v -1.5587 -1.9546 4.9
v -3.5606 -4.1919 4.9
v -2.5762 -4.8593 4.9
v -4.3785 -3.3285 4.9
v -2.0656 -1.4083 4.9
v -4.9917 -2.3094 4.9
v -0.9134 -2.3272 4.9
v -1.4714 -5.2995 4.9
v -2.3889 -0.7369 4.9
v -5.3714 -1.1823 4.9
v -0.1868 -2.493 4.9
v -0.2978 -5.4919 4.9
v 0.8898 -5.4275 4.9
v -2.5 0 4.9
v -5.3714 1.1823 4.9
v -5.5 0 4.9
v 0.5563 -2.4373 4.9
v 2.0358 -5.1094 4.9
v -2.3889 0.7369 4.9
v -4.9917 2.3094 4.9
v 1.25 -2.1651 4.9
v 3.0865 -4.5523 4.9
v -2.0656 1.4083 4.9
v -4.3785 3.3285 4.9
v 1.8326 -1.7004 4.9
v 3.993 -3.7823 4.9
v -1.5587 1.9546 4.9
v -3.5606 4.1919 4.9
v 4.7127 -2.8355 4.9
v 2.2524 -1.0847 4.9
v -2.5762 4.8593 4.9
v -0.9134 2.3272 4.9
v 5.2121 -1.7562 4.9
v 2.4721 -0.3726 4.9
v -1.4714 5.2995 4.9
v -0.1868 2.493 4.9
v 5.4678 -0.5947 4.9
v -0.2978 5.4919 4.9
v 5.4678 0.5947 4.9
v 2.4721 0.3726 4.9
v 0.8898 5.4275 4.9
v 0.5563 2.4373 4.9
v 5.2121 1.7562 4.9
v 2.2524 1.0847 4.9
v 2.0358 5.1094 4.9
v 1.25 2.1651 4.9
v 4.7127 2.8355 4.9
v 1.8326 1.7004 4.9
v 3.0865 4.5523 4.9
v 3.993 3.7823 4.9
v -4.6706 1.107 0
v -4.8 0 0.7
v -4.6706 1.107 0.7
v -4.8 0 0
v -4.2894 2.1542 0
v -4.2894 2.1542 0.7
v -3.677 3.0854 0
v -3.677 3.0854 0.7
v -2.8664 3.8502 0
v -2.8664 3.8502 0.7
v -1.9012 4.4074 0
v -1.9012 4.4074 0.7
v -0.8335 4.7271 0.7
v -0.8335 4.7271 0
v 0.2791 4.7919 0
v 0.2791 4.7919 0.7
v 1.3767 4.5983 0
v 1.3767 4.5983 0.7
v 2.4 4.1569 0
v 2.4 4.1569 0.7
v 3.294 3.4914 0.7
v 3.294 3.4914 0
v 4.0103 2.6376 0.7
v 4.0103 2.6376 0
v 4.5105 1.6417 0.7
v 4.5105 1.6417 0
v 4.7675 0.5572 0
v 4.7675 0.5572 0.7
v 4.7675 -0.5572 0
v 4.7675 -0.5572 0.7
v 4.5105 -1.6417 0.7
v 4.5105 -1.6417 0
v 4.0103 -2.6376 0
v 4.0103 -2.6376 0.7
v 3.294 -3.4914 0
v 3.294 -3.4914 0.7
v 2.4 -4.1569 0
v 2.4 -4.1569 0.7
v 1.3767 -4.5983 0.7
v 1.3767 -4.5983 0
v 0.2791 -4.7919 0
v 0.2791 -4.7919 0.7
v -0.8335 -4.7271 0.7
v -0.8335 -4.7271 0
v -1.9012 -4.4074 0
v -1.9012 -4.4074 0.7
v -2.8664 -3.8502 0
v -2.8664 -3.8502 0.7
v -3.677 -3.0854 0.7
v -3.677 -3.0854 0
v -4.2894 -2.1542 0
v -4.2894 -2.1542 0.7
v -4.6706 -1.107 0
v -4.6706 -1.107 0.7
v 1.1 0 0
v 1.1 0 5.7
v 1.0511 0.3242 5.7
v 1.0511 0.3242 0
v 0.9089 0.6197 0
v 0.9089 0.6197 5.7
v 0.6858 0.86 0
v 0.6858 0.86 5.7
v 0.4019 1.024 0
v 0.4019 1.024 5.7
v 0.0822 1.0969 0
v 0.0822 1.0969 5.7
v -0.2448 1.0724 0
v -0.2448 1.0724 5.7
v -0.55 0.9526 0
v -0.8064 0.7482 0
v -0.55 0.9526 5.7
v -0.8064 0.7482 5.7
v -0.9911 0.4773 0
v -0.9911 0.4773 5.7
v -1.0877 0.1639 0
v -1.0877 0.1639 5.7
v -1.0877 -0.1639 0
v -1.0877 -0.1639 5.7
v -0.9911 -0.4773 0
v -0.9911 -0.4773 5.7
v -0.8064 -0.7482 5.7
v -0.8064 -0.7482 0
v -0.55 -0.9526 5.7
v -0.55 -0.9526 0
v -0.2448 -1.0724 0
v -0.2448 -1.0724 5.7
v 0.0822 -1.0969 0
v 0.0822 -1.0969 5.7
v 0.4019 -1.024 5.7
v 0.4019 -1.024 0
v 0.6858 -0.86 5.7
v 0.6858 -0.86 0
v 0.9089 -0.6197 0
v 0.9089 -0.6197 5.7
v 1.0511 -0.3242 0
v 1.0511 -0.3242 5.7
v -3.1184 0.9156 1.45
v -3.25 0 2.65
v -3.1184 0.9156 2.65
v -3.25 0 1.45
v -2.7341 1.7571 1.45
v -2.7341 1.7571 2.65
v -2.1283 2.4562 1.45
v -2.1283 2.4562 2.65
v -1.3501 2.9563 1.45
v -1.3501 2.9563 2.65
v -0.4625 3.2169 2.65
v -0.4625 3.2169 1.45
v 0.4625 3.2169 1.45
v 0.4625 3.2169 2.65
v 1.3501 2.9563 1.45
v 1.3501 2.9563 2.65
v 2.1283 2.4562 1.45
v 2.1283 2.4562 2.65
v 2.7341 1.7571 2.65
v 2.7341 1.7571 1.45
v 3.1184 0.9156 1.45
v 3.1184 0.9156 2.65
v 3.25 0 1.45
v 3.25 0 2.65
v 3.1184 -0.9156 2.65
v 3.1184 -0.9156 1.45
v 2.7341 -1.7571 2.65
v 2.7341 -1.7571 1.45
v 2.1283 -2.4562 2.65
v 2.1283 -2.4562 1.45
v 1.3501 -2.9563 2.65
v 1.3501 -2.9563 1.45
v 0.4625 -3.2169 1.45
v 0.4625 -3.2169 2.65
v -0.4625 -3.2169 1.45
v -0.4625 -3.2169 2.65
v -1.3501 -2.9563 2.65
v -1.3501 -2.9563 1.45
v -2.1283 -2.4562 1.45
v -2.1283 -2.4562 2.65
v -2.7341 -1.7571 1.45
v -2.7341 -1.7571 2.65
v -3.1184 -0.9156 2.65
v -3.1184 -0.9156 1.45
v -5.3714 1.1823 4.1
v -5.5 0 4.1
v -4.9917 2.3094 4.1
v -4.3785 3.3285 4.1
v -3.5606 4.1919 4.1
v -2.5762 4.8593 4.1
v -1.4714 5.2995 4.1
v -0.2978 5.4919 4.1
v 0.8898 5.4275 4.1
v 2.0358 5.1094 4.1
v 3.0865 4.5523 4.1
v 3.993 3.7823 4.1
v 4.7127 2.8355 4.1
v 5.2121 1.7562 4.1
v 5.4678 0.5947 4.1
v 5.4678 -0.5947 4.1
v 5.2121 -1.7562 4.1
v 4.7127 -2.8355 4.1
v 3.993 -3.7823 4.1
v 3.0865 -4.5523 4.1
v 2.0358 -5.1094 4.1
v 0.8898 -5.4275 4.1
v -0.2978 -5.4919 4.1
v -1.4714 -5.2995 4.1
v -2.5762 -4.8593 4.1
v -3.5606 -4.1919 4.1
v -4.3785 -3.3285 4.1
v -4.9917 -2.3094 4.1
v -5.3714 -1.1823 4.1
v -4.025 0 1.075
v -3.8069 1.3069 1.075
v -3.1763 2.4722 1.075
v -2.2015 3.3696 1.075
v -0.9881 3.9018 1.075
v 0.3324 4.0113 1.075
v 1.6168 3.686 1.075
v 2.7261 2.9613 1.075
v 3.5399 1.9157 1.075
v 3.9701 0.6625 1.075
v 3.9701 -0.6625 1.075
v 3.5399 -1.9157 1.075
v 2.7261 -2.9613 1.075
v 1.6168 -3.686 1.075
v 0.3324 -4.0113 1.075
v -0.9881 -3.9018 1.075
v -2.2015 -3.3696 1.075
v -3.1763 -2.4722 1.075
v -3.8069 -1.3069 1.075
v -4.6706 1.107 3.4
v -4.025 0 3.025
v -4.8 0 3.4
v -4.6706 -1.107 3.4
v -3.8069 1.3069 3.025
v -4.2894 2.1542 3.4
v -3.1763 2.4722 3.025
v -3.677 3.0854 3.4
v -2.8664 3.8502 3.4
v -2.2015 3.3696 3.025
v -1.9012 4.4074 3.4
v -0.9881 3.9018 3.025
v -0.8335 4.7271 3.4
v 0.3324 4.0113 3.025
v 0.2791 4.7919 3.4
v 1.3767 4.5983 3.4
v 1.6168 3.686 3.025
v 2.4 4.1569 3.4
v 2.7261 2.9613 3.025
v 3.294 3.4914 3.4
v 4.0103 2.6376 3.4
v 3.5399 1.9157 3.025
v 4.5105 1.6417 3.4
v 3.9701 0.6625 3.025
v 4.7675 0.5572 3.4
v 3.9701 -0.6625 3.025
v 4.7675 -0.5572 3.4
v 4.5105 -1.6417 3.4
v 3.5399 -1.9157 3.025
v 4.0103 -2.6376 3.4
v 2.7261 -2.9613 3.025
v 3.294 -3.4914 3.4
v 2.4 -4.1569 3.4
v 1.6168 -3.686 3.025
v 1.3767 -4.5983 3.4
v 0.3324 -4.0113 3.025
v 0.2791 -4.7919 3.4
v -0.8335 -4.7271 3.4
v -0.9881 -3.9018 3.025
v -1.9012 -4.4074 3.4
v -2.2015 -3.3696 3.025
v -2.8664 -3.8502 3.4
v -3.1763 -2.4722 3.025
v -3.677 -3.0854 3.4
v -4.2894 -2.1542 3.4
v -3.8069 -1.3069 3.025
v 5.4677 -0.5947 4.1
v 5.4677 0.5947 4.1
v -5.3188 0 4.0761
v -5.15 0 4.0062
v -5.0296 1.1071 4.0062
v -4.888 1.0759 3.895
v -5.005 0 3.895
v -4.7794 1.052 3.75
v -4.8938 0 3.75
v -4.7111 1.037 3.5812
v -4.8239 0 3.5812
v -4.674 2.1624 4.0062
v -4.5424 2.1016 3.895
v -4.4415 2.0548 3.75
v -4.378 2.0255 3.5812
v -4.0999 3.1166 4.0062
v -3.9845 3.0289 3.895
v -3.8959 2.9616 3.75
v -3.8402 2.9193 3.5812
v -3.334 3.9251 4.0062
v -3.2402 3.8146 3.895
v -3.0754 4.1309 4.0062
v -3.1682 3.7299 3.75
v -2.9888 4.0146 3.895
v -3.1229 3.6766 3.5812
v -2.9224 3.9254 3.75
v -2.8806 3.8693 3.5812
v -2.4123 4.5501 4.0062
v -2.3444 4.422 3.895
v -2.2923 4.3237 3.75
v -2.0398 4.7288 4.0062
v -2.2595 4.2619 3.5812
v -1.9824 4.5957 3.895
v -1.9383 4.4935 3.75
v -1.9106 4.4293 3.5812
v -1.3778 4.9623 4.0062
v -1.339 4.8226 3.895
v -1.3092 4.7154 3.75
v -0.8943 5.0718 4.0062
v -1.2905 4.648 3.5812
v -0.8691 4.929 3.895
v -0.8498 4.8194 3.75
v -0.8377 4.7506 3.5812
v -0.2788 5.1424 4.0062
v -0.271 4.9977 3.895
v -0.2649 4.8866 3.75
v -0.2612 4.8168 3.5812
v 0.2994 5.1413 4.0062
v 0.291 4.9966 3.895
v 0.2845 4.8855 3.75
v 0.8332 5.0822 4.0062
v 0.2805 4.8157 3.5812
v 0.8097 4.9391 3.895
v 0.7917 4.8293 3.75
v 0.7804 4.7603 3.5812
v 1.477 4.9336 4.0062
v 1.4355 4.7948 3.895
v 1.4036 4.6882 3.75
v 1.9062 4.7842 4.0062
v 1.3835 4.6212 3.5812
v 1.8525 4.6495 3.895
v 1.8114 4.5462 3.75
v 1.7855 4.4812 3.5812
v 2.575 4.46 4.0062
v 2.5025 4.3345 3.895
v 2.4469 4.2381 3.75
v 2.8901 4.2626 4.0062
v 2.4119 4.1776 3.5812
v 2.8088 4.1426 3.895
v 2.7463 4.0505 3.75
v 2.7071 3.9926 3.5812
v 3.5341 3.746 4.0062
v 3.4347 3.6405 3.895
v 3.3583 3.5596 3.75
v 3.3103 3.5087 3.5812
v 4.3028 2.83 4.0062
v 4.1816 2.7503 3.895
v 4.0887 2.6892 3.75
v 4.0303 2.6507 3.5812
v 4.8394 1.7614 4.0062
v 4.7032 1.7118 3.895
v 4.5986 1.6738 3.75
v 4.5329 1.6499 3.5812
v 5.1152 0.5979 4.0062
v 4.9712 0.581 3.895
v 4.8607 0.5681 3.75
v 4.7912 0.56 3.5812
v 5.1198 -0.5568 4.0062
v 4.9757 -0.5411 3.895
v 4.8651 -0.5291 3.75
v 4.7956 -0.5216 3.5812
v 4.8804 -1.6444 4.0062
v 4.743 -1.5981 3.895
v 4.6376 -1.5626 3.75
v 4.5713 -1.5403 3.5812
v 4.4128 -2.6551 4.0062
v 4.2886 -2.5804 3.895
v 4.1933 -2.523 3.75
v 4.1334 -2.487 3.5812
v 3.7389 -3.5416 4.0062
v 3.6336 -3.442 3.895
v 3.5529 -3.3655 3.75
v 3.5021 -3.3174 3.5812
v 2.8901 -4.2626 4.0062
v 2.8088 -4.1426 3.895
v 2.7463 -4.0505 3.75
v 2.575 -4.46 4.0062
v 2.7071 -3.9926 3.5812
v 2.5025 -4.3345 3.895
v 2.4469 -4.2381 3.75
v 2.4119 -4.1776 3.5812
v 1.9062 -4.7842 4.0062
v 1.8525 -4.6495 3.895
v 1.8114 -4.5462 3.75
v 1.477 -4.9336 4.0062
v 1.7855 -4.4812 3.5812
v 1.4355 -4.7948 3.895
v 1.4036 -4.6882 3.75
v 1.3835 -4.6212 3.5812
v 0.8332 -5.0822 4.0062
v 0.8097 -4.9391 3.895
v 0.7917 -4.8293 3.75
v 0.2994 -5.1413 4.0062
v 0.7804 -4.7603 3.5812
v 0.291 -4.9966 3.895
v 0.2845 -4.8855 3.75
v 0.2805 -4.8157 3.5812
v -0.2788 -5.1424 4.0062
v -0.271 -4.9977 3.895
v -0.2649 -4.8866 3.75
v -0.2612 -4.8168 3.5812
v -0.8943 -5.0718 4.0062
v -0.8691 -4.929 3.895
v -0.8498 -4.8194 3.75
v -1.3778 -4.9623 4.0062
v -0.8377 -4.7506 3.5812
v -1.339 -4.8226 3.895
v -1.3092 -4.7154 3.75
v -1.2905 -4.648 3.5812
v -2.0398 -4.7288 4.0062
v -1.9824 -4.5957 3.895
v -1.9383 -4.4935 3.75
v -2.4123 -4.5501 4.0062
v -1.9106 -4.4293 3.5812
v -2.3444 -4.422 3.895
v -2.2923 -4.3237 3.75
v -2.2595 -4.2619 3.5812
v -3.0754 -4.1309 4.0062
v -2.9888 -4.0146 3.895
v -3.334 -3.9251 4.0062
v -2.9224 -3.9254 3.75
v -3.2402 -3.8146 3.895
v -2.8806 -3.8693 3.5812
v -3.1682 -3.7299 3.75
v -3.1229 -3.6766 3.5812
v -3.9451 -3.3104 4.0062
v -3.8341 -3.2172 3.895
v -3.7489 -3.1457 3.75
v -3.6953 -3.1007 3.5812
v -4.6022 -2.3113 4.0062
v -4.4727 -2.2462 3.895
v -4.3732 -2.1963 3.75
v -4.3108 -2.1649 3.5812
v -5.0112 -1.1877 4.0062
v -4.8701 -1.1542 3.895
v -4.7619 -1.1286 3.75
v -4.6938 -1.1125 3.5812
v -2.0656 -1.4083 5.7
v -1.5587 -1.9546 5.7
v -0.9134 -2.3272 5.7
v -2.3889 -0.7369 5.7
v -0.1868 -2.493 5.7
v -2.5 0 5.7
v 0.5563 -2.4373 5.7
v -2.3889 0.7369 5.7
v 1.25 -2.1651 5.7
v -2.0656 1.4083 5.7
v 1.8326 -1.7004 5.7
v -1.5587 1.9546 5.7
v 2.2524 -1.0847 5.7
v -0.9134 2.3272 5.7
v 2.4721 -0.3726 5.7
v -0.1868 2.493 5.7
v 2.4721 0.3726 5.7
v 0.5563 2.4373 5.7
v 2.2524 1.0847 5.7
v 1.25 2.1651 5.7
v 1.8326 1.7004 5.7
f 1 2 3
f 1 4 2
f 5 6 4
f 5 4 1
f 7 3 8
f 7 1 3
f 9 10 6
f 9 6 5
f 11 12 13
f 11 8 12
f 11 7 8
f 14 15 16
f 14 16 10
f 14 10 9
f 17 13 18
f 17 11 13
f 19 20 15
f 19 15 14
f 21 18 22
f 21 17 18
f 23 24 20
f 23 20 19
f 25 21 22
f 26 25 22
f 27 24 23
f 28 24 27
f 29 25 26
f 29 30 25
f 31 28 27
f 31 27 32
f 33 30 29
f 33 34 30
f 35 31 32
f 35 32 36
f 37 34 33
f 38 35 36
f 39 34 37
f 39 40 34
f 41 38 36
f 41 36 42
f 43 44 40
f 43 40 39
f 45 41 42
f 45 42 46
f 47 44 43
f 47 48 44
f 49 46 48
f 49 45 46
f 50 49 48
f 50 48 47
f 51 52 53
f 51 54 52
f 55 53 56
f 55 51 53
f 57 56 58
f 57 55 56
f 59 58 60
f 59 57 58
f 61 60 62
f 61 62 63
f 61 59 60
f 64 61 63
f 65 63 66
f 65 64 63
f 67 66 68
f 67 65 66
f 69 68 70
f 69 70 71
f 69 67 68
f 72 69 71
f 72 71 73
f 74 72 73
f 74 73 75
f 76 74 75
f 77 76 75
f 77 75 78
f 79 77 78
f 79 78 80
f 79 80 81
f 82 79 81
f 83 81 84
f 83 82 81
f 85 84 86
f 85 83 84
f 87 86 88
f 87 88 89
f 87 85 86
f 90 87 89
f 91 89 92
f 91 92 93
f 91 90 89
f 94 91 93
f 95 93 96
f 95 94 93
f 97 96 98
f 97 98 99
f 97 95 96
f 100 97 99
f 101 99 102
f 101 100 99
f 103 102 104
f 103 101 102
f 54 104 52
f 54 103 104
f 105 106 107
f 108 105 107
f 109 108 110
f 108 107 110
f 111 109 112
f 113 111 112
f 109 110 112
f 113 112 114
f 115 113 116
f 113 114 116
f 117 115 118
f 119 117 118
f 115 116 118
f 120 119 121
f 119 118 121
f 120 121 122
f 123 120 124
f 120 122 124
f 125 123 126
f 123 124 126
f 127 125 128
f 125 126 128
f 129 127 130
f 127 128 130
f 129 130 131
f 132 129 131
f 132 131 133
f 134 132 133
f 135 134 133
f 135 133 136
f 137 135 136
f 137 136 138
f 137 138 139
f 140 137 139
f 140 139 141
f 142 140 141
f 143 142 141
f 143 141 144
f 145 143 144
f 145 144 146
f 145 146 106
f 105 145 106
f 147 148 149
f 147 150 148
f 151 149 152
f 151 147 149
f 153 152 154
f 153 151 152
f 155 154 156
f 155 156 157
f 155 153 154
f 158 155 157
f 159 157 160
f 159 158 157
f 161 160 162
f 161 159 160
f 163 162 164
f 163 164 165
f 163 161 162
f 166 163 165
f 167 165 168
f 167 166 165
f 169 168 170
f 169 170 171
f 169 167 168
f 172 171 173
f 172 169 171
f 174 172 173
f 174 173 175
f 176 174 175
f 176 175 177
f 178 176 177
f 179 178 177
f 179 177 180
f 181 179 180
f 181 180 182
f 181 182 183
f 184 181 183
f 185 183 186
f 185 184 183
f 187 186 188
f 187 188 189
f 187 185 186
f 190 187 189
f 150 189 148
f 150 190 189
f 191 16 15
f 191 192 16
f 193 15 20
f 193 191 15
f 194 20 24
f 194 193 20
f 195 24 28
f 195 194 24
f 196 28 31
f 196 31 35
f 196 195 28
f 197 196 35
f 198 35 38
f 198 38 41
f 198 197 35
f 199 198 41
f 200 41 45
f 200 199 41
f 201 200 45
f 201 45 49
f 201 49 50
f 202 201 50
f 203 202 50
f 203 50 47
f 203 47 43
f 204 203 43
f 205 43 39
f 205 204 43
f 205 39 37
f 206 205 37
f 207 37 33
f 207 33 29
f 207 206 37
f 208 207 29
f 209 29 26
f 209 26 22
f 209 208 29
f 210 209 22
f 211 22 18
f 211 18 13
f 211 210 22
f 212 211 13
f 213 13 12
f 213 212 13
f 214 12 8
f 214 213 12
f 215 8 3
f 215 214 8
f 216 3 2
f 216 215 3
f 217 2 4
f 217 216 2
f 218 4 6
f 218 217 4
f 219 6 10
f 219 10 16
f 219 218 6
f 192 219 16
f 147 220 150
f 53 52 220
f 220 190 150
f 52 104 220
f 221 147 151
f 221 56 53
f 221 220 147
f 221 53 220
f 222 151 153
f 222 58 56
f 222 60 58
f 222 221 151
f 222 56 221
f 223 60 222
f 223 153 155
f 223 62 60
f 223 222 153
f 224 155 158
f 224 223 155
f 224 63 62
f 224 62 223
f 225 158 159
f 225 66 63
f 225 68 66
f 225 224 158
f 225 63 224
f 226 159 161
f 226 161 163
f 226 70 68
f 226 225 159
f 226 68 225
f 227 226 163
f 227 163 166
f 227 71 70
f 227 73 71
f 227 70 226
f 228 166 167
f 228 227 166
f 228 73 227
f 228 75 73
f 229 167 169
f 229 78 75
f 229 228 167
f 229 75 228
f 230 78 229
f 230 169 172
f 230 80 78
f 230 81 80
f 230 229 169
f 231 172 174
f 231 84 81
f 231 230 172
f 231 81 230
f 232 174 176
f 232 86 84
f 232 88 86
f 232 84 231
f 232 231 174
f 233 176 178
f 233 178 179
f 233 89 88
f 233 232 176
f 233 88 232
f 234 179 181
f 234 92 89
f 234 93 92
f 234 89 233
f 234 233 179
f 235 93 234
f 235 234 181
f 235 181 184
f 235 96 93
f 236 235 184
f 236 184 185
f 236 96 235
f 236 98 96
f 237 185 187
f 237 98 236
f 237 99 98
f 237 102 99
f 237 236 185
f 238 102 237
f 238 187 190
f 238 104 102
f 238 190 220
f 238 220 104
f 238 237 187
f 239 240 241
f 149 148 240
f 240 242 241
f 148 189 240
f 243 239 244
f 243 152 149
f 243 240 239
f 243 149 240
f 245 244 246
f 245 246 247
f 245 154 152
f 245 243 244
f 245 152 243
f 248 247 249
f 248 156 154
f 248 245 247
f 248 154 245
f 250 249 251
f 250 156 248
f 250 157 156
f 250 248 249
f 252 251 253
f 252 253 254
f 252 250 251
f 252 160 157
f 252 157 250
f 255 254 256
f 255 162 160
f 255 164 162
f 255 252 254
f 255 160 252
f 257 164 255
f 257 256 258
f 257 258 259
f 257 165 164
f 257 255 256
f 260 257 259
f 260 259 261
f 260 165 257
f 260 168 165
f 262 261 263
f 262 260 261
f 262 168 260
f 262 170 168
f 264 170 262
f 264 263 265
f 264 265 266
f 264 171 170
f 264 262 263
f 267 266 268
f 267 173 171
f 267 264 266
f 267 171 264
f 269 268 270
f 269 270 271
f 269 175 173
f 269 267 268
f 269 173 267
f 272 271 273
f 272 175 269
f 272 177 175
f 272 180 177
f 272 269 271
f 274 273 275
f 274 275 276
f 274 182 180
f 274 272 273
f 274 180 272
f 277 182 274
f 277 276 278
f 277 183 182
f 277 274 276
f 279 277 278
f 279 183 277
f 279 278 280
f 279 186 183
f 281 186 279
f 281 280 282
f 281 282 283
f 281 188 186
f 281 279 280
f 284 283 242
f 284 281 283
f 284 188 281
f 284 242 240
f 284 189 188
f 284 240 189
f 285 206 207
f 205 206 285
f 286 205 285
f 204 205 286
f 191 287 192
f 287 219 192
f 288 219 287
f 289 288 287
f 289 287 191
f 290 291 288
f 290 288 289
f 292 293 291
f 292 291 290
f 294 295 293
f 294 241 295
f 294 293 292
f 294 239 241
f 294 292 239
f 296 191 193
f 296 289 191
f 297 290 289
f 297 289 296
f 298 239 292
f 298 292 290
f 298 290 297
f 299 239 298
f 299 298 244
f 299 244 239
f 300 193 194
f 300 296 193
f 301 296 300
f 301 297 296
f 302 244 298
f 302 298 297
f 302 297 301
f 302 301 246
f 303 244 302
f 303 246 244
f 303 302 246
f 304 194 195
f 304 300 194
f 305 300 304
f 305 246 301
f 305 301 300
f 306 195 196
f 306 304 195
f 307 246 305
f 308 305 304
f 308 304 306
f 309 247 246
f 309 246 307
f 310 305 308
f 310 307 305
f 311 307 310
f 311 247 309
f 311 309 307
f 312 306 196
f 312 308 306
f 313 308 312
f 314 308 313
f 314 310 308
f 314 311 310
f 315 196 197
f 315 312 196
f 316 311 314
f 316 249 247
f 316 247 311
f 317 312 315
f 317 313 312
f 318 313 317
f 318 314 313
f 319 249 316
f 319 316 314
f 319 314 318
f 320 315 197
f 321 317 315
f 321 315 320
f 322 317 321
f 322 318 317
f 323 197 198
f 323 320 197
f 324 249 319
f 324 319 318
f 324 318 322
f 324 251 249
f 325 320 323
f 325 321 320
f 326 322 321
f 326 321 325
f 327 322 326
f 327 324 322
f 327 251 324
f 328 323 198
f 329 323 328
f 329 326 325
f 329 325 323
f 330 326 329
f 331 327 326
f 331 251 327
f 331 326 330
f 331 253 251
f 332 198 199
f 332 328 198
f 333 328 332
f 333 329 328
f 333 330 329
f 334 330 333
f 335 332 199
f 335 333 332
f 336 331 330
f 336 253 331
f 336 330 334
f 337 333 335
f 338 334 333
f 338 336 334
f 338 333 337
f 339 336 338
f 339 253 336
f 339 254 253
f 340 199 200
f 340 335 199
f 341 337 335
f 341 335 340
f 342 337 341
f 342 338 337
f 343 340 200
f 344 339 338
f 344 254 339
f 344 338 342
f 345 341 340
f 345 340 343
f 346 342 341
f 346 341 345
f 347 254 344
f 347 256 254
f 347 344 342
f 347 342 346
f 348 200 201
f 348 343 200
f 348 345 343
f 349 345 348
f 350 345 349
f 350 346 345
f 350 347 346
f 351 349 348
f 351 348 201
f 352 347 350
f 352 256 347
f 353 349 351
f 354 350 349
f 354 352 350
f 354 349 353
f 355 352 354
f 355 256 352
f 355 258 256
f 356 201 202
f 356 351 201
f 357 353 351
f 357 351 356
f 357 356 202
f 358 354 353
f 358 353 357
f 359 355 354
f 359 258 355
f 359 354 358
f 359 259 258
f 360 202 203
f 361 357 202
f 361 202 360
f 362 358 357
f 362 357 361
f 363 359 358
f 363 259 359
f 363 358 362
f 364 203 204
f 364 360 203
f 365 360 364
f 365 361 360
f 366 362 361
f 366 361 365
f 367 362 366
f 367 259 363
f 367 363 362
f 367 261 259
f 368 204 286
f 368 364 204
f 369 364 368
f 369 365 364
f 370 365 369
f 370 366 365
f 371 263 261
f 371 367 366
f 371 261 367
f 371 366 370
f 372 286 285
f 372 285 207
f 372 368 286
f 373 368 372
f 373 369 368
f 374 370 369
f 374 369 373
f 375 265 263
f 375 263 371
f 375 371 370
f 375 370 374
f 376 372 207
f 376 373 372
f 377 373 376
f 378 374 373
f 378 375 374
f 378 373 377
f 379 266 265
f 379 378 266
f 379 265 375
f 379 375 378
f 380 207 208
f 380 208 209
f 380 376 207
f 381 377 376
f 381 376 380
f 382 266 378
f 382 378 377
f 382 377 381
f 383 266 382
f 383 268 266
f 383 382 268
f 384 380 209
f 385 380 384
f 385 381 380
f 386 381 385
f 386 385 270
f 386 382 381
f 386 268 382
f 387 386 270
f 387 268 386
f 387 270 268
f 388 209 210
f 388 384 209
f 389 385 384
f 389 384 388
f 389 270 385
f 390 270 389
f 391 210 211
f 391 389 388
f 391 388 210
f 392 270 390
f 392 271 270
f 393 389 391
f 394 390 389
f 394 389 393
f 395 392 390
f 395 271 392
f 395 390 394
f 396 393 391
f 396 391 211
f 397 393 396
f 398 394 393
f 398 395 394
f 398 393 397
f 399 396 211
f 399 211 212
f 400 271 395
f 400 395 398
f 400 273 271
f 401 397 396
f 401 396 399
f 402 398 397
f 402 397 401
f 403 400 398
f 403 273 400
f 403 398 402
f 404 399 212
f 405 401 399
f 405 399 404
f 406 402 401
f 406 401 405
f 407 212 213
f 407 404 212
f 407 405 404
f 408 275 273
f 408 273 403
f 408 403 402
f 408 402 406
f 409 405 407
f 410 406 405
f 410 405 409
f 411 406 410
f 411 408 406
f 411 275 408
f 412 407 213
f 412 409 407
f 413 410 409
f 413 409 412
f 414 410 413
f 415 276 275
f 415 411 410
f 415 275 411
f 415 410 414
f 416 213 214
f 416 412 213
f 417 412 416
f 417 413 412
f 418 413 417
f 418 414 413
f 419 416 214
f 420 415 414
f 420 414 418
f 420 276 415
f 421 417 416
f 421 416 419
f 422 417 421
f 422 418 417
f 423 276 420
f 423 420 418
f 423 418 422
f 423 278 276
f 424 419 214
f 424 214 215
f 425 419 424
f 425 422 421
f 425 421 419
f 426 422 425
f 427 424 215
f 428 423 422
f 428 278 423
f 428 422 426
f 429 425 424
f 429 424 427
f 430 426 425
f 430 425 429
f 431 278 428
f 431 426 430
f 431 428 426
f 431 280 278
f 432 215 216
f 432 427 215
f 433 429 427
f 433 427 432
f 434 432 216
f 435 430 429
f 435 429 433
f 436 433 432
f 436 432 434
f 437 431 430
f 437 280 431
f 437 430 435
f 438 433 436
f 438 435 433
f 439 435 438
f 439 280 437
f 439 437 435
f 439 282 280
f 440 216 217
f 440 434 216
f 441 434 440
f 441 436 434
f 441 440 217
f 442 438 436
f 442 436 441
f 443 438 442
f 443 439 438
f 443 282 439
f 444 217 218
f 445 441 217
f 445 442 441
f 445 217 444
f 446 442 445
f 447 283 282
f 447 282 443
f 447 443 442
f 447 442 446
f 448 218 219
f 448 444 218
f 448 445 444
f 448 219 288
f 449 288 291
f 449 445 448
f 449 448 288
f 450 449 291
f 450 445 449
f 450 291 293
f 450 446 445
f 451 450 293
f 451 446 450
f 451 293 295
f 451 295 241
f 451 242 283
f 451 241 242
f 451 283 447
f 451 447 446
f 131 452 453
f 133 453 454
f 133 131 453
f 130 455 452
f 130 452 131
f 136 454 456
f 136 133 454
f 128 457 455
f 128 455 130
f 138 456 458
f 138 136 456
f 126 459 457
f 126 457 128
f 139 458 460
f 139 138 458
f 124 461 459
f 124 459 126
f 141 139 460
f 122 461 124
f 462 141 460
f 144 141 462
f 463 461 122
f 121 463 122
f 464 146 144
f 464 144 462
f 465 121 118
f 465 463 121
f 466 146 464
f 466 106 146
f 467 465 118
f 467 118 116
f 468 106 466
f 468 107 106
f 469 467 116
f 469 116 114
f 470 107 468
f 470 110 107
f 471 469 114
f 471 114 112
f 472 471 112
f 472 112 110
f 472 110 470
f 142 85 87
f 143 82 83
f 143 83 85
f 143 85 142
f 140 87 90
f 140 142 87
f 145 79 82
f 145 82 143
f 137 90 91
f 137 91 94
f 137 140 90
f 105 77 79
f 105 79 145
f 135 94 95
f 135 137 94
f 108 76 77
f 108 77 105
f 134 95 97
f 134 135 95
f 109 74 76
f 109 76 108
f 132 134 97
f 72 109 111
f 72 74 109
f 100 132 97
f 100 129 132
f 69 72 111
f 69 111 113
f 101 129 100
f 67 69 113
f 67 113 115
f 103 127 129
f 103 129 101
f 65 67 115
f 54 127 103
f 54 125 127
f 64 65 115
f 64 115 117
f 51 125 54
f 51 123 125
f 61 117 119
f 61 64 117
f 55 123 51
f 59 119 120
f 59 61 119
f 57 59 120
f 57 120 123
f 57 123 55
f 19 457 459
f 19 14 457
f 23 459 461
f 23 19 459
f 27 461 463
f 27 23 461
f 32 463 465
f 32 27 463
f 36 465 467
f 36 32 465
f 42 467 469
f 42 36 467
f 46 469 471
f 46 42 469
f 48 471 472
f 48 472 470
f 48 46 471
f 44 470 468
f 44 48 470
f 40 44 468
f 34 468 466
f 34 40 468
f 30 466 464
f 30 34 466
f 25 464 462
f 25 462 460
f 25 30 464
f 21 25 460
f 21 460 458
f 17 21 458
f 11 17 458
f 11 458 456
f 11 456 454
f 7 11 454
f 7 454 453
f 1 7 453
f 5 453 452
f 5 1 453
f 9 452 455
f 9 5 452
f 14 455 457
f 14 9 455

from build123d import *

# Parameters (mm, degrees)
F2_R     = 0.69999
F3_R     = 1.1
F4_DEPTH = 5.701


# Not quite as in the source:
# - a fillet or chamfer is up to 0.001 mm smaller than in the source, because OpenCascade refuses the exact size


with BuildPart() as f1:
    # F0 (on Front) → F1 (revolve)
    with BuildSketch(Plane.XZ):
        Polygon((-4.8, 0), (0, 0), (0, 5.7), (-2.5, 5.7), (-2.5, 4.9), (-5.5, 4.9), (-5.5, 4.1), (-4.8, 4.1), (-4.8, 3.4), (-3.25, 2.65), (-3.25, 1.45), (-4.8, 0.7), align=None)
    revolve(axis=Axis((0, 0, 2.85), (0, 0, -1)))

    # F2 (radius 0.7 in the source; OpenCascade refuses exactly that, so slightly less here)
    f2_edges = [f1.edges().sort_by_distance(p)[0] for p in [
        (4.8, 0, 4.1),
    ]]
    fillet(f2_edges, radius=F2_R)

    # F3 (on face) → F4 (cut, through all)
    with BuildSketch(Plane.XY.offset(5.7)):
        Circle(F3_R)
    extrude(amount=-F4_DEPTH, mode=Mode.SUBTRACT)


solid = f1.part
